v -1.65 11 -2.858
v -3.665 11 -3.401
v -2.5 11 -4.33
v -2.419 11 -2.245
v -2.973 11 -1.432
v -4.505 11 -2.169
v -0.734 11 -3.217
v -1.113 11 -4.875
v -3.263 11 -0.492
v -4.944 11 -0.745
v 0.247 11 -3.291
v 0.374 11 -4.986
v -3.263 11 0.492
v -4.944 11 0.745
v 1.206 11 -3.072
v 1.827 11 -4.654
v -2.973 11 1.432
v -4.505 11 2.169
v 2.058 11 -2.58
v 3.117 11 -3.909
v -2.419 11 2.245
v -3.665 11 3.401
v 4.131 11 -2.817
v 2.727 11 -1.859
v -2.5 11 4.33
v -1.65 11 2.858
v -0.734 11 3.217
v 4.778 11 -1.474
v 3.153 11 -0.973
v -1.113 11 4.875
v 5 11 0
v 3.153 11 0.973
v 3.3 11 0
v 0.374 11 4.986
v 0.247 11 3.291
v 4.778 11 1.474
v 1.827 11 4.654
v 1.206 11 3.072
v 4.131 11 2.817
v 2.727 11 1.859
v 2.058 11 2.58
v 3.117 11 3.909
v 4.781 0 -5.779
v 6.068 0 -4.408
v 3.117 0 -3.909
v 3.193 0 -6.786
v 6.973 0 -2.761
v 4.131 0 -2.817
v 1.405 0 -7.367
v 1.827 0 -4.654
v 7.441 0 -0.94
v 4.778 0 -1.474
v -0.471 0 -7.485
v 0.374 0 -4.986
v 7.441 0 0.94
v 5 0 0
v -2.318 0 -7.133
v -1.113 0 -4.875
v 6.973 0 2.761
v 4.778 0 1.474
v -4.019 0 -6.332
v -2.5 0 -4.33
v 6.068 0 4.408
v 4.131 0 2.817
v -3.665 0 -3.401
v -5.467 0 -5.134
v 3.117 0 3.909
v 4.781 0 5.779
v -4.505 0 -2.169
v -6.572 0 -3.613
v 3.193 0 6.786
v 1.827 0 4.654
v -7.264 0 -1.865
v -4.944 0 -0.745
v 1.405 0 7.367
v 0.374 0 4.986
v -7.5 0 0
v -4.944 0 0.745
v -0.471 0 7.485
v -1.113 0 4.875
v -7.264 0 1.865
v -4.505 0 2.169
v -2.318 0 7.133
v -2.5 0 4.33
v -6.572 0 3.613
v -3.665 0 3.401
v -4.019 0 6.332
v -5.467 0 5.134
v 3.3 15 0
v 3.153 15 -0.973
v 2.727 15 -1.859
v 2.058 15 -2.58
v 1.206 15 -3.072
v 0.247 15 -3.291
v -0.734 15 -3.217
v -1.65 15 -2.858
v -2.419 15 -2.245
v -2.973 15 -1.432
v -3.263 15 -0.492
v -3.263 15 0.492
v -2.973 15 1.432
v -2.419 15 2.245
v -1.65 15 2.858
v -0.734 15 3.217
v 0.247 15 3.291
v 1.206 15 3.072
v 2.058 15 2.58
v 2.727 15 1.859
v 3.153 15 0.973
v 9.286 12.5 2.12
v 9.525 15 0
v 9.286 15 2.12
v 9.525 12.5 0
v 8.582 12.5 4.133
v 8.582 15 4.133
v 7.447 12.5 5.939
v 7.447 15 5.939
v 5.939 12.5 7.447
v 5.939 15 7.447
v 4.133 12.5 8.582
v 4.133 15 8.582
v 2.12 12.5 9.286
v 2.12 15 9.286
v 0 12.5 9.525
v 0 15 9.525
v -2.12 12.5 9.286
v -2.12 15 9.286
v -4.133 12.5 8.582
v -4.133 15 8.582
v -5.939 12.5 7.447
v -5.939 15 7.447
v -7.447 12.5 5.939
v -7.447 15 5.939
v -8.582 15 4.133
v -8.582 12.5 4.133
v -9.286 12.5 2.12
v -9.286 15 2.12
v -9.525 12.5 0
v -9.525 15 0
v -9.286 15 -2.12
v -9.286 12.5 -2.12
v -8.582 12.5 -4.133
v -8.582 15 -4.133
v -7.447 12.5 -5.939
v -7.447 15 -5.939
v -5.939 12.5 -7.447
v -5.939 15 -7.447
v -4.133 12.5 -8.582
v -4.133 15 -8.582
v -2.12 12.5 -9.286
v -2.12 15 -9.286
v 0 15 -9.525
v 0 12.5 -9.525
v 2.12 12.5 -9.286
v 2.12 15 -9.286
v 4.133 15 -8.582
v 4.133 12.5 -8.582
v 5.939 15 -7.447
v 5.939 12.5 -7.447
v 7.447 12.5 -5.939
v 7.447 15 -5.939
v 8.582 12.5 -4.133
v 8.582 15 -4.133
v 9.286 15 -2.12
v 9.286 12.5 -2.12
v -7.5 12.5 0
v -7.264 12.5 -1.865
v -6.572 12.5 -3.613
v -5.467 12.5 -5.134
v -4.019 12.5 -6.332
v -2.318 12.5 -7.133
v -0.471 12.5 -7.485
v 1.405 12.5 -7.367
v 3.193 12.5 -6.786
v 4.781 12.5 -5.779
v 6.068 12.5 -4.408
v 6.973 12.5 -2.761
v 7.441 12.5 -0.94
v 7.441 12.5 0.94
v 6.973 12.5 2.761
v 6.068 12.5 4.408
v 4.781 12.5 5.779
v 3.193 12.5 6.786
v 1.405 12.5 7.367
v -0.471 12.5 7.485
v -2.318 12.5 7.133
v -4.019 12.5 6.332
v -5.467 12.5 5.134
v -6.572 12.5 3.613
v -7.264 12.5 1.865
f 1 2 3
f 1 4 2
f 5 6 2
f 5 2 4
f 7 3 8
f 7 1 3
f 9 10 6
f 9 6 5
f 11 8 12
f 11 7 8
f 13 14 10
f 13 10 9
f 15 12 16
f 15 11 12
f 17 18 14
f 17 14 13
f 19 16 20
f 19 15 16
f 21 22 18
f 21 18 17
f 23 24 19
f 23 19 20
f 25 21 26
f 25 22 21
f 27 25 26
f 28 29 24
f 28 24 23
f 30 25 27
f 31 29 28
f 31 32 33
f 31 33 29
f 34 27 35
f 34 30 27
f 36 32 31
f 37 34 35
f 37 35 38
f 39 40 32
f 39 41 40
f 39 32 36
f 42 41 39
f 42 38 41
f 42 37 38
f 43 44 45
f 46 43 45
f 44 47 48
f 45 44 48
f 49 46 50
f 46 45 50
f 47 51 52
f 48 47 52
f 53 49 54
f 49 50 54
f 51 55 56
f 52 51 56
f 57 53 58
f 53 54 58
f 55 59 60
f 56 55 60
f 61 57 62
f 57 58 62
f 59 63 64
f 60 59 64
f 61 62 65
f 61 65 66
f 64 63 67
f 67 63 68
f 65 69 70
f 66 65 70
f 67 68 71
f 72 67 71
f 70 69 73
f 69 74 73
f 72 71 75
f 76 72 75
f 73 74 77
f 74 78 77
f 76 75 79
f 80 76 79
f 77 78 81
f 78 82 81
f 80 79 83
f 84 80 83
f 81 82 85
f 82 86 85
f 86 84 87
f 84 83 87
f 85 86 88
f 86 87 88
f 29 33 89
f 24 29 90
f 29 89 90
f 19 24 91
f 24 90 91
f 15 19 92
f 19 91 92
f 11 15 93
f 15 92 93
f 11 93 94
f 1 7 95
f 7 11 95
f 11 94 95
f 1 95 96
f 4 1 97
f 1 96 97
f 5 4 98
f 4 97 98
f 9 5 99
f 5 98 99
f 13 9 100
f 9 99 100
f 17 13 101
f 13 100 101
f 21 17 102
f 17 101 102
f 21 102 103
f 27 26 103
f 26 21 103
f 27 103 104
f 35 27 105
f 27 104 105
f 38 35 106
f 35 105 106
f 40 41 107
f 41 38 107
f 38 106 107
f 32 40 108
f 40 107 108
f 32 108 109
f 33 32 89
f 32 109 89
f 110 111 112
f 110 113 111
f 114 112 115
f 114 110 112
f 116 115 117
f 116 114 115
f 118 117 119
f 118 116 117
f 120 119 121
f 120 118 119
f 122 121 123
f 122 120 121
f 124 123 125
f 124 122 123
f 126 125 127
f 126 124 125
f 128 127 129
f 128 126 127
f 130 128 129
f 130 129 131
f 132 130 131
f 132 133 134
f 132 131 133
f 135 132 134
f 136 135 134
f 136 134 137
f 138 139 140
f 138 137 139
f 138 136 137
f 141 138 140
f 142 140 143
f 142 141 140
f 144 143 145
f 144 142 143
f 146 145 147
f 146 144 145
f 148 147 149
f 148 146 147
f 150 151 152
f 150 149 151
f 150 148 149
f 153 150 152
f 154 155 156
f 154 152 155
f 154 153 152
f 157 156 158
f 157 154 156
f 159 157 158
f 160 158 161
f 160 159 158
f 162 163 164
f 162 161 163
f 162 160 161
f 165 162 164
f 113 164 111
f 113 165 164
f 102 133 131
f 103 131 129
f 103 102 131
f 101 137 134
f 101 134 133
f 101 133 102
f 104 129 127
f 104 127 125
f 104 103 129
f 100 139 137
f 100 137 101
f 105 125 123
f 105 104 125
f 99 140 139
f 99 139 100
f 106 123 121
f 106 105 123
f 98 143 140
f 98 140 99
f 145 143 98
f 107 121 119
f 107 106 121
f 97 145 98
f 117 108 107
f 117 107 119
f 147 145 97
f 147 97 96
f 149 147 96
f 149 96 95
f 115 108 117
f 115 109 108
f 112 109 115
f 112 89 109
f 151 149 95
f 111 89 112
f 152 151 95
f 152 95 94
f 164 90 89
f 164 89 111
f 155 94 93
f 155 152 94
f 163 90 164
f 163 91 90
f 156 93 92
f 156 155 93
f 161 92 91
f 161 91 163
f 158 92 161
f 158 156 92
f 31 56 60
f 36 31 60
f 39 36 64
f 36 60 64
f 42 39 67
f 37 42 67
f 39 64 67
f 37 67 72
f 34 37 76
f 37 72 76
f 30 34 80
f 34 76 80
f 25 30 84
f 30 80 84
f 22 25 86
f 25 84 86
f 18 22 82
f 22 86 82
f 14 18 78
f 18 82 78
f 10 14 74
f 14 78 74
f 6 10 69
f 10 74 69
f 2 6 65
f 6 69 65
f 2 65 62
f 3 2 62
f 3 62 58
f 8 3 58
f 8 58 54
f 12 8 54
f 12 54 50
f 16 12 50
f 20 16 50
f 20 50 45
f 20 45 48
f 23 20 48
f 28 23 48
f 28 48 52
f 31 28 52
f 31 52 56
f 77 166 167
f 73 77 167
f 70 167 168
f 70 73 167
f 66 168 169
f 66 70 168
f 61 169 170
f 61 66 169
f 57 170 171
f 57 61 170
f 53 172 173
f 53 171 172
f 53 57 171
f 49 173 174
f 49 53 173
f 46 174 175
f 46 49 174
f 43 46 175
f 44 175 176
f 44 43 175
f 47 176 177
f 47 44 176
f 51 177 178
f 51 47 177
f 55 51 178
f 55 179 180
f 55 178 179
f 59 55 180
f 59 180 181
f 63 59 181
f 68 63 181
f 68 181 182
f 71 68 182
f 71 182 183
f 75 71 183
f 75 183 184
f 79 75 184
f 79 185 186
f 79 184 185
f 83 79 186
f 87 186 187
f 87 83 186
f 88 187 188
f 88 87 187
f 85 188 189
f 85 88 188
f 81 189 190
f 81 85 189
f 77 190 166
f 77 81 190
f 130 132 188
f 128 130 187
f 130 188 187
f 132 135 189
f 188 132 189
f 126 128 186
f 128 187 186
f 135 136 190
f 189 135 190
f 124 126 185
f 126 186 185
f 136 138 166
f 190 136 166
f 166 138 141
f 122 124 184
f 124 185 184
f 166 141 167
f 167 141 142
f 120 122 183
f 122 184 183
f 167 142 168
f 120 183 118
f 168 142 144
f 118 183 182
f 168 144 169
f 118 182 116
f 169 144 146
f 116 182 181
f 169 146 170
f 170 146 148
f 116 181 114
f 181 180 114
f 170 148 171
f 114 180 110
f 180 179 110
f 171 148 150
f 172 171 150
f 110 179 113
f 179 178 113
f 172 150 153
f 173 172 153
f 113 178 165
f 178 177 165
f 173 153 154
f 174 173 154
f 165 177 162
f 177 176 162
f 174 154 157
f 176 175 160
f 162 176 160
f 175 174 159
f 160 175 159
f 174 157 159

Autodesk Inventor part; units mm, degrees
ref_plane "YZ Plane" through (0, 0, 0) normal (1, 0, 0) x (0, 1, 0)
ref_plane "XZ Plane" through (0, 0, 0) normal (0, 1, 0) x (-1, 0, 0)
ref_plane "XY Plane" through (0, 0, 0) normal (0, 0, 1) x (1, 0, 0)
sketch "Sketch1" plane through (0, 0, 0) normal (0, 1, 0) x (-1, 0, 0)
  circle A0 centre (0, 0) radius 7.5
  dimension "d0" = 15
extrude "Extrusion1" add sketch "Sketch1" along normal blind 12.5
sketch "Sketch2" plane through (0, 12.5, 0) normal (0, 1, 0) x (1, 0, 0)
  circle A0 centre (0, 0) radius 7.5 projected
  circle A1 centre (0, 0) radius 9.525
  dimension "d3" = 19.05
extrude "Extrusion2" add sketch "Sketch2" along normal blind 2.5 contours A0 | A1
sketch "Sketch3" plane through (0, 15, 0) normal (0, 1, 0) x (1, 0, 0)
  circle A0 centre (0, 0) radius 9.525 projected
  circle A1 centre (0, 0) radius 3.3
  dimension "d6" = 6.6
extrude "Extrusion3" cut sketch "Sketch3" against normal blind 17.75 contours A1
sketch "Sketch4" plane through (0, 0, 0) normal (0, -1, 0) x (1, 0, 0)
  circle A0 centre (0, 0) radius 3.3 projected
  circle A1 centre (0, 0) radius 7.5 projected
  circle A2 centre (0, 0) radius 5
  dimension "d9" = 10
extrude "Extrusion4" cut sketch "Sketch4" against normal blind 11 contours A2
thread "Thread1" size "M10x1.5" class "6H" standard "ANSI Metric M Profile" full length
properties part number "Isolator"
